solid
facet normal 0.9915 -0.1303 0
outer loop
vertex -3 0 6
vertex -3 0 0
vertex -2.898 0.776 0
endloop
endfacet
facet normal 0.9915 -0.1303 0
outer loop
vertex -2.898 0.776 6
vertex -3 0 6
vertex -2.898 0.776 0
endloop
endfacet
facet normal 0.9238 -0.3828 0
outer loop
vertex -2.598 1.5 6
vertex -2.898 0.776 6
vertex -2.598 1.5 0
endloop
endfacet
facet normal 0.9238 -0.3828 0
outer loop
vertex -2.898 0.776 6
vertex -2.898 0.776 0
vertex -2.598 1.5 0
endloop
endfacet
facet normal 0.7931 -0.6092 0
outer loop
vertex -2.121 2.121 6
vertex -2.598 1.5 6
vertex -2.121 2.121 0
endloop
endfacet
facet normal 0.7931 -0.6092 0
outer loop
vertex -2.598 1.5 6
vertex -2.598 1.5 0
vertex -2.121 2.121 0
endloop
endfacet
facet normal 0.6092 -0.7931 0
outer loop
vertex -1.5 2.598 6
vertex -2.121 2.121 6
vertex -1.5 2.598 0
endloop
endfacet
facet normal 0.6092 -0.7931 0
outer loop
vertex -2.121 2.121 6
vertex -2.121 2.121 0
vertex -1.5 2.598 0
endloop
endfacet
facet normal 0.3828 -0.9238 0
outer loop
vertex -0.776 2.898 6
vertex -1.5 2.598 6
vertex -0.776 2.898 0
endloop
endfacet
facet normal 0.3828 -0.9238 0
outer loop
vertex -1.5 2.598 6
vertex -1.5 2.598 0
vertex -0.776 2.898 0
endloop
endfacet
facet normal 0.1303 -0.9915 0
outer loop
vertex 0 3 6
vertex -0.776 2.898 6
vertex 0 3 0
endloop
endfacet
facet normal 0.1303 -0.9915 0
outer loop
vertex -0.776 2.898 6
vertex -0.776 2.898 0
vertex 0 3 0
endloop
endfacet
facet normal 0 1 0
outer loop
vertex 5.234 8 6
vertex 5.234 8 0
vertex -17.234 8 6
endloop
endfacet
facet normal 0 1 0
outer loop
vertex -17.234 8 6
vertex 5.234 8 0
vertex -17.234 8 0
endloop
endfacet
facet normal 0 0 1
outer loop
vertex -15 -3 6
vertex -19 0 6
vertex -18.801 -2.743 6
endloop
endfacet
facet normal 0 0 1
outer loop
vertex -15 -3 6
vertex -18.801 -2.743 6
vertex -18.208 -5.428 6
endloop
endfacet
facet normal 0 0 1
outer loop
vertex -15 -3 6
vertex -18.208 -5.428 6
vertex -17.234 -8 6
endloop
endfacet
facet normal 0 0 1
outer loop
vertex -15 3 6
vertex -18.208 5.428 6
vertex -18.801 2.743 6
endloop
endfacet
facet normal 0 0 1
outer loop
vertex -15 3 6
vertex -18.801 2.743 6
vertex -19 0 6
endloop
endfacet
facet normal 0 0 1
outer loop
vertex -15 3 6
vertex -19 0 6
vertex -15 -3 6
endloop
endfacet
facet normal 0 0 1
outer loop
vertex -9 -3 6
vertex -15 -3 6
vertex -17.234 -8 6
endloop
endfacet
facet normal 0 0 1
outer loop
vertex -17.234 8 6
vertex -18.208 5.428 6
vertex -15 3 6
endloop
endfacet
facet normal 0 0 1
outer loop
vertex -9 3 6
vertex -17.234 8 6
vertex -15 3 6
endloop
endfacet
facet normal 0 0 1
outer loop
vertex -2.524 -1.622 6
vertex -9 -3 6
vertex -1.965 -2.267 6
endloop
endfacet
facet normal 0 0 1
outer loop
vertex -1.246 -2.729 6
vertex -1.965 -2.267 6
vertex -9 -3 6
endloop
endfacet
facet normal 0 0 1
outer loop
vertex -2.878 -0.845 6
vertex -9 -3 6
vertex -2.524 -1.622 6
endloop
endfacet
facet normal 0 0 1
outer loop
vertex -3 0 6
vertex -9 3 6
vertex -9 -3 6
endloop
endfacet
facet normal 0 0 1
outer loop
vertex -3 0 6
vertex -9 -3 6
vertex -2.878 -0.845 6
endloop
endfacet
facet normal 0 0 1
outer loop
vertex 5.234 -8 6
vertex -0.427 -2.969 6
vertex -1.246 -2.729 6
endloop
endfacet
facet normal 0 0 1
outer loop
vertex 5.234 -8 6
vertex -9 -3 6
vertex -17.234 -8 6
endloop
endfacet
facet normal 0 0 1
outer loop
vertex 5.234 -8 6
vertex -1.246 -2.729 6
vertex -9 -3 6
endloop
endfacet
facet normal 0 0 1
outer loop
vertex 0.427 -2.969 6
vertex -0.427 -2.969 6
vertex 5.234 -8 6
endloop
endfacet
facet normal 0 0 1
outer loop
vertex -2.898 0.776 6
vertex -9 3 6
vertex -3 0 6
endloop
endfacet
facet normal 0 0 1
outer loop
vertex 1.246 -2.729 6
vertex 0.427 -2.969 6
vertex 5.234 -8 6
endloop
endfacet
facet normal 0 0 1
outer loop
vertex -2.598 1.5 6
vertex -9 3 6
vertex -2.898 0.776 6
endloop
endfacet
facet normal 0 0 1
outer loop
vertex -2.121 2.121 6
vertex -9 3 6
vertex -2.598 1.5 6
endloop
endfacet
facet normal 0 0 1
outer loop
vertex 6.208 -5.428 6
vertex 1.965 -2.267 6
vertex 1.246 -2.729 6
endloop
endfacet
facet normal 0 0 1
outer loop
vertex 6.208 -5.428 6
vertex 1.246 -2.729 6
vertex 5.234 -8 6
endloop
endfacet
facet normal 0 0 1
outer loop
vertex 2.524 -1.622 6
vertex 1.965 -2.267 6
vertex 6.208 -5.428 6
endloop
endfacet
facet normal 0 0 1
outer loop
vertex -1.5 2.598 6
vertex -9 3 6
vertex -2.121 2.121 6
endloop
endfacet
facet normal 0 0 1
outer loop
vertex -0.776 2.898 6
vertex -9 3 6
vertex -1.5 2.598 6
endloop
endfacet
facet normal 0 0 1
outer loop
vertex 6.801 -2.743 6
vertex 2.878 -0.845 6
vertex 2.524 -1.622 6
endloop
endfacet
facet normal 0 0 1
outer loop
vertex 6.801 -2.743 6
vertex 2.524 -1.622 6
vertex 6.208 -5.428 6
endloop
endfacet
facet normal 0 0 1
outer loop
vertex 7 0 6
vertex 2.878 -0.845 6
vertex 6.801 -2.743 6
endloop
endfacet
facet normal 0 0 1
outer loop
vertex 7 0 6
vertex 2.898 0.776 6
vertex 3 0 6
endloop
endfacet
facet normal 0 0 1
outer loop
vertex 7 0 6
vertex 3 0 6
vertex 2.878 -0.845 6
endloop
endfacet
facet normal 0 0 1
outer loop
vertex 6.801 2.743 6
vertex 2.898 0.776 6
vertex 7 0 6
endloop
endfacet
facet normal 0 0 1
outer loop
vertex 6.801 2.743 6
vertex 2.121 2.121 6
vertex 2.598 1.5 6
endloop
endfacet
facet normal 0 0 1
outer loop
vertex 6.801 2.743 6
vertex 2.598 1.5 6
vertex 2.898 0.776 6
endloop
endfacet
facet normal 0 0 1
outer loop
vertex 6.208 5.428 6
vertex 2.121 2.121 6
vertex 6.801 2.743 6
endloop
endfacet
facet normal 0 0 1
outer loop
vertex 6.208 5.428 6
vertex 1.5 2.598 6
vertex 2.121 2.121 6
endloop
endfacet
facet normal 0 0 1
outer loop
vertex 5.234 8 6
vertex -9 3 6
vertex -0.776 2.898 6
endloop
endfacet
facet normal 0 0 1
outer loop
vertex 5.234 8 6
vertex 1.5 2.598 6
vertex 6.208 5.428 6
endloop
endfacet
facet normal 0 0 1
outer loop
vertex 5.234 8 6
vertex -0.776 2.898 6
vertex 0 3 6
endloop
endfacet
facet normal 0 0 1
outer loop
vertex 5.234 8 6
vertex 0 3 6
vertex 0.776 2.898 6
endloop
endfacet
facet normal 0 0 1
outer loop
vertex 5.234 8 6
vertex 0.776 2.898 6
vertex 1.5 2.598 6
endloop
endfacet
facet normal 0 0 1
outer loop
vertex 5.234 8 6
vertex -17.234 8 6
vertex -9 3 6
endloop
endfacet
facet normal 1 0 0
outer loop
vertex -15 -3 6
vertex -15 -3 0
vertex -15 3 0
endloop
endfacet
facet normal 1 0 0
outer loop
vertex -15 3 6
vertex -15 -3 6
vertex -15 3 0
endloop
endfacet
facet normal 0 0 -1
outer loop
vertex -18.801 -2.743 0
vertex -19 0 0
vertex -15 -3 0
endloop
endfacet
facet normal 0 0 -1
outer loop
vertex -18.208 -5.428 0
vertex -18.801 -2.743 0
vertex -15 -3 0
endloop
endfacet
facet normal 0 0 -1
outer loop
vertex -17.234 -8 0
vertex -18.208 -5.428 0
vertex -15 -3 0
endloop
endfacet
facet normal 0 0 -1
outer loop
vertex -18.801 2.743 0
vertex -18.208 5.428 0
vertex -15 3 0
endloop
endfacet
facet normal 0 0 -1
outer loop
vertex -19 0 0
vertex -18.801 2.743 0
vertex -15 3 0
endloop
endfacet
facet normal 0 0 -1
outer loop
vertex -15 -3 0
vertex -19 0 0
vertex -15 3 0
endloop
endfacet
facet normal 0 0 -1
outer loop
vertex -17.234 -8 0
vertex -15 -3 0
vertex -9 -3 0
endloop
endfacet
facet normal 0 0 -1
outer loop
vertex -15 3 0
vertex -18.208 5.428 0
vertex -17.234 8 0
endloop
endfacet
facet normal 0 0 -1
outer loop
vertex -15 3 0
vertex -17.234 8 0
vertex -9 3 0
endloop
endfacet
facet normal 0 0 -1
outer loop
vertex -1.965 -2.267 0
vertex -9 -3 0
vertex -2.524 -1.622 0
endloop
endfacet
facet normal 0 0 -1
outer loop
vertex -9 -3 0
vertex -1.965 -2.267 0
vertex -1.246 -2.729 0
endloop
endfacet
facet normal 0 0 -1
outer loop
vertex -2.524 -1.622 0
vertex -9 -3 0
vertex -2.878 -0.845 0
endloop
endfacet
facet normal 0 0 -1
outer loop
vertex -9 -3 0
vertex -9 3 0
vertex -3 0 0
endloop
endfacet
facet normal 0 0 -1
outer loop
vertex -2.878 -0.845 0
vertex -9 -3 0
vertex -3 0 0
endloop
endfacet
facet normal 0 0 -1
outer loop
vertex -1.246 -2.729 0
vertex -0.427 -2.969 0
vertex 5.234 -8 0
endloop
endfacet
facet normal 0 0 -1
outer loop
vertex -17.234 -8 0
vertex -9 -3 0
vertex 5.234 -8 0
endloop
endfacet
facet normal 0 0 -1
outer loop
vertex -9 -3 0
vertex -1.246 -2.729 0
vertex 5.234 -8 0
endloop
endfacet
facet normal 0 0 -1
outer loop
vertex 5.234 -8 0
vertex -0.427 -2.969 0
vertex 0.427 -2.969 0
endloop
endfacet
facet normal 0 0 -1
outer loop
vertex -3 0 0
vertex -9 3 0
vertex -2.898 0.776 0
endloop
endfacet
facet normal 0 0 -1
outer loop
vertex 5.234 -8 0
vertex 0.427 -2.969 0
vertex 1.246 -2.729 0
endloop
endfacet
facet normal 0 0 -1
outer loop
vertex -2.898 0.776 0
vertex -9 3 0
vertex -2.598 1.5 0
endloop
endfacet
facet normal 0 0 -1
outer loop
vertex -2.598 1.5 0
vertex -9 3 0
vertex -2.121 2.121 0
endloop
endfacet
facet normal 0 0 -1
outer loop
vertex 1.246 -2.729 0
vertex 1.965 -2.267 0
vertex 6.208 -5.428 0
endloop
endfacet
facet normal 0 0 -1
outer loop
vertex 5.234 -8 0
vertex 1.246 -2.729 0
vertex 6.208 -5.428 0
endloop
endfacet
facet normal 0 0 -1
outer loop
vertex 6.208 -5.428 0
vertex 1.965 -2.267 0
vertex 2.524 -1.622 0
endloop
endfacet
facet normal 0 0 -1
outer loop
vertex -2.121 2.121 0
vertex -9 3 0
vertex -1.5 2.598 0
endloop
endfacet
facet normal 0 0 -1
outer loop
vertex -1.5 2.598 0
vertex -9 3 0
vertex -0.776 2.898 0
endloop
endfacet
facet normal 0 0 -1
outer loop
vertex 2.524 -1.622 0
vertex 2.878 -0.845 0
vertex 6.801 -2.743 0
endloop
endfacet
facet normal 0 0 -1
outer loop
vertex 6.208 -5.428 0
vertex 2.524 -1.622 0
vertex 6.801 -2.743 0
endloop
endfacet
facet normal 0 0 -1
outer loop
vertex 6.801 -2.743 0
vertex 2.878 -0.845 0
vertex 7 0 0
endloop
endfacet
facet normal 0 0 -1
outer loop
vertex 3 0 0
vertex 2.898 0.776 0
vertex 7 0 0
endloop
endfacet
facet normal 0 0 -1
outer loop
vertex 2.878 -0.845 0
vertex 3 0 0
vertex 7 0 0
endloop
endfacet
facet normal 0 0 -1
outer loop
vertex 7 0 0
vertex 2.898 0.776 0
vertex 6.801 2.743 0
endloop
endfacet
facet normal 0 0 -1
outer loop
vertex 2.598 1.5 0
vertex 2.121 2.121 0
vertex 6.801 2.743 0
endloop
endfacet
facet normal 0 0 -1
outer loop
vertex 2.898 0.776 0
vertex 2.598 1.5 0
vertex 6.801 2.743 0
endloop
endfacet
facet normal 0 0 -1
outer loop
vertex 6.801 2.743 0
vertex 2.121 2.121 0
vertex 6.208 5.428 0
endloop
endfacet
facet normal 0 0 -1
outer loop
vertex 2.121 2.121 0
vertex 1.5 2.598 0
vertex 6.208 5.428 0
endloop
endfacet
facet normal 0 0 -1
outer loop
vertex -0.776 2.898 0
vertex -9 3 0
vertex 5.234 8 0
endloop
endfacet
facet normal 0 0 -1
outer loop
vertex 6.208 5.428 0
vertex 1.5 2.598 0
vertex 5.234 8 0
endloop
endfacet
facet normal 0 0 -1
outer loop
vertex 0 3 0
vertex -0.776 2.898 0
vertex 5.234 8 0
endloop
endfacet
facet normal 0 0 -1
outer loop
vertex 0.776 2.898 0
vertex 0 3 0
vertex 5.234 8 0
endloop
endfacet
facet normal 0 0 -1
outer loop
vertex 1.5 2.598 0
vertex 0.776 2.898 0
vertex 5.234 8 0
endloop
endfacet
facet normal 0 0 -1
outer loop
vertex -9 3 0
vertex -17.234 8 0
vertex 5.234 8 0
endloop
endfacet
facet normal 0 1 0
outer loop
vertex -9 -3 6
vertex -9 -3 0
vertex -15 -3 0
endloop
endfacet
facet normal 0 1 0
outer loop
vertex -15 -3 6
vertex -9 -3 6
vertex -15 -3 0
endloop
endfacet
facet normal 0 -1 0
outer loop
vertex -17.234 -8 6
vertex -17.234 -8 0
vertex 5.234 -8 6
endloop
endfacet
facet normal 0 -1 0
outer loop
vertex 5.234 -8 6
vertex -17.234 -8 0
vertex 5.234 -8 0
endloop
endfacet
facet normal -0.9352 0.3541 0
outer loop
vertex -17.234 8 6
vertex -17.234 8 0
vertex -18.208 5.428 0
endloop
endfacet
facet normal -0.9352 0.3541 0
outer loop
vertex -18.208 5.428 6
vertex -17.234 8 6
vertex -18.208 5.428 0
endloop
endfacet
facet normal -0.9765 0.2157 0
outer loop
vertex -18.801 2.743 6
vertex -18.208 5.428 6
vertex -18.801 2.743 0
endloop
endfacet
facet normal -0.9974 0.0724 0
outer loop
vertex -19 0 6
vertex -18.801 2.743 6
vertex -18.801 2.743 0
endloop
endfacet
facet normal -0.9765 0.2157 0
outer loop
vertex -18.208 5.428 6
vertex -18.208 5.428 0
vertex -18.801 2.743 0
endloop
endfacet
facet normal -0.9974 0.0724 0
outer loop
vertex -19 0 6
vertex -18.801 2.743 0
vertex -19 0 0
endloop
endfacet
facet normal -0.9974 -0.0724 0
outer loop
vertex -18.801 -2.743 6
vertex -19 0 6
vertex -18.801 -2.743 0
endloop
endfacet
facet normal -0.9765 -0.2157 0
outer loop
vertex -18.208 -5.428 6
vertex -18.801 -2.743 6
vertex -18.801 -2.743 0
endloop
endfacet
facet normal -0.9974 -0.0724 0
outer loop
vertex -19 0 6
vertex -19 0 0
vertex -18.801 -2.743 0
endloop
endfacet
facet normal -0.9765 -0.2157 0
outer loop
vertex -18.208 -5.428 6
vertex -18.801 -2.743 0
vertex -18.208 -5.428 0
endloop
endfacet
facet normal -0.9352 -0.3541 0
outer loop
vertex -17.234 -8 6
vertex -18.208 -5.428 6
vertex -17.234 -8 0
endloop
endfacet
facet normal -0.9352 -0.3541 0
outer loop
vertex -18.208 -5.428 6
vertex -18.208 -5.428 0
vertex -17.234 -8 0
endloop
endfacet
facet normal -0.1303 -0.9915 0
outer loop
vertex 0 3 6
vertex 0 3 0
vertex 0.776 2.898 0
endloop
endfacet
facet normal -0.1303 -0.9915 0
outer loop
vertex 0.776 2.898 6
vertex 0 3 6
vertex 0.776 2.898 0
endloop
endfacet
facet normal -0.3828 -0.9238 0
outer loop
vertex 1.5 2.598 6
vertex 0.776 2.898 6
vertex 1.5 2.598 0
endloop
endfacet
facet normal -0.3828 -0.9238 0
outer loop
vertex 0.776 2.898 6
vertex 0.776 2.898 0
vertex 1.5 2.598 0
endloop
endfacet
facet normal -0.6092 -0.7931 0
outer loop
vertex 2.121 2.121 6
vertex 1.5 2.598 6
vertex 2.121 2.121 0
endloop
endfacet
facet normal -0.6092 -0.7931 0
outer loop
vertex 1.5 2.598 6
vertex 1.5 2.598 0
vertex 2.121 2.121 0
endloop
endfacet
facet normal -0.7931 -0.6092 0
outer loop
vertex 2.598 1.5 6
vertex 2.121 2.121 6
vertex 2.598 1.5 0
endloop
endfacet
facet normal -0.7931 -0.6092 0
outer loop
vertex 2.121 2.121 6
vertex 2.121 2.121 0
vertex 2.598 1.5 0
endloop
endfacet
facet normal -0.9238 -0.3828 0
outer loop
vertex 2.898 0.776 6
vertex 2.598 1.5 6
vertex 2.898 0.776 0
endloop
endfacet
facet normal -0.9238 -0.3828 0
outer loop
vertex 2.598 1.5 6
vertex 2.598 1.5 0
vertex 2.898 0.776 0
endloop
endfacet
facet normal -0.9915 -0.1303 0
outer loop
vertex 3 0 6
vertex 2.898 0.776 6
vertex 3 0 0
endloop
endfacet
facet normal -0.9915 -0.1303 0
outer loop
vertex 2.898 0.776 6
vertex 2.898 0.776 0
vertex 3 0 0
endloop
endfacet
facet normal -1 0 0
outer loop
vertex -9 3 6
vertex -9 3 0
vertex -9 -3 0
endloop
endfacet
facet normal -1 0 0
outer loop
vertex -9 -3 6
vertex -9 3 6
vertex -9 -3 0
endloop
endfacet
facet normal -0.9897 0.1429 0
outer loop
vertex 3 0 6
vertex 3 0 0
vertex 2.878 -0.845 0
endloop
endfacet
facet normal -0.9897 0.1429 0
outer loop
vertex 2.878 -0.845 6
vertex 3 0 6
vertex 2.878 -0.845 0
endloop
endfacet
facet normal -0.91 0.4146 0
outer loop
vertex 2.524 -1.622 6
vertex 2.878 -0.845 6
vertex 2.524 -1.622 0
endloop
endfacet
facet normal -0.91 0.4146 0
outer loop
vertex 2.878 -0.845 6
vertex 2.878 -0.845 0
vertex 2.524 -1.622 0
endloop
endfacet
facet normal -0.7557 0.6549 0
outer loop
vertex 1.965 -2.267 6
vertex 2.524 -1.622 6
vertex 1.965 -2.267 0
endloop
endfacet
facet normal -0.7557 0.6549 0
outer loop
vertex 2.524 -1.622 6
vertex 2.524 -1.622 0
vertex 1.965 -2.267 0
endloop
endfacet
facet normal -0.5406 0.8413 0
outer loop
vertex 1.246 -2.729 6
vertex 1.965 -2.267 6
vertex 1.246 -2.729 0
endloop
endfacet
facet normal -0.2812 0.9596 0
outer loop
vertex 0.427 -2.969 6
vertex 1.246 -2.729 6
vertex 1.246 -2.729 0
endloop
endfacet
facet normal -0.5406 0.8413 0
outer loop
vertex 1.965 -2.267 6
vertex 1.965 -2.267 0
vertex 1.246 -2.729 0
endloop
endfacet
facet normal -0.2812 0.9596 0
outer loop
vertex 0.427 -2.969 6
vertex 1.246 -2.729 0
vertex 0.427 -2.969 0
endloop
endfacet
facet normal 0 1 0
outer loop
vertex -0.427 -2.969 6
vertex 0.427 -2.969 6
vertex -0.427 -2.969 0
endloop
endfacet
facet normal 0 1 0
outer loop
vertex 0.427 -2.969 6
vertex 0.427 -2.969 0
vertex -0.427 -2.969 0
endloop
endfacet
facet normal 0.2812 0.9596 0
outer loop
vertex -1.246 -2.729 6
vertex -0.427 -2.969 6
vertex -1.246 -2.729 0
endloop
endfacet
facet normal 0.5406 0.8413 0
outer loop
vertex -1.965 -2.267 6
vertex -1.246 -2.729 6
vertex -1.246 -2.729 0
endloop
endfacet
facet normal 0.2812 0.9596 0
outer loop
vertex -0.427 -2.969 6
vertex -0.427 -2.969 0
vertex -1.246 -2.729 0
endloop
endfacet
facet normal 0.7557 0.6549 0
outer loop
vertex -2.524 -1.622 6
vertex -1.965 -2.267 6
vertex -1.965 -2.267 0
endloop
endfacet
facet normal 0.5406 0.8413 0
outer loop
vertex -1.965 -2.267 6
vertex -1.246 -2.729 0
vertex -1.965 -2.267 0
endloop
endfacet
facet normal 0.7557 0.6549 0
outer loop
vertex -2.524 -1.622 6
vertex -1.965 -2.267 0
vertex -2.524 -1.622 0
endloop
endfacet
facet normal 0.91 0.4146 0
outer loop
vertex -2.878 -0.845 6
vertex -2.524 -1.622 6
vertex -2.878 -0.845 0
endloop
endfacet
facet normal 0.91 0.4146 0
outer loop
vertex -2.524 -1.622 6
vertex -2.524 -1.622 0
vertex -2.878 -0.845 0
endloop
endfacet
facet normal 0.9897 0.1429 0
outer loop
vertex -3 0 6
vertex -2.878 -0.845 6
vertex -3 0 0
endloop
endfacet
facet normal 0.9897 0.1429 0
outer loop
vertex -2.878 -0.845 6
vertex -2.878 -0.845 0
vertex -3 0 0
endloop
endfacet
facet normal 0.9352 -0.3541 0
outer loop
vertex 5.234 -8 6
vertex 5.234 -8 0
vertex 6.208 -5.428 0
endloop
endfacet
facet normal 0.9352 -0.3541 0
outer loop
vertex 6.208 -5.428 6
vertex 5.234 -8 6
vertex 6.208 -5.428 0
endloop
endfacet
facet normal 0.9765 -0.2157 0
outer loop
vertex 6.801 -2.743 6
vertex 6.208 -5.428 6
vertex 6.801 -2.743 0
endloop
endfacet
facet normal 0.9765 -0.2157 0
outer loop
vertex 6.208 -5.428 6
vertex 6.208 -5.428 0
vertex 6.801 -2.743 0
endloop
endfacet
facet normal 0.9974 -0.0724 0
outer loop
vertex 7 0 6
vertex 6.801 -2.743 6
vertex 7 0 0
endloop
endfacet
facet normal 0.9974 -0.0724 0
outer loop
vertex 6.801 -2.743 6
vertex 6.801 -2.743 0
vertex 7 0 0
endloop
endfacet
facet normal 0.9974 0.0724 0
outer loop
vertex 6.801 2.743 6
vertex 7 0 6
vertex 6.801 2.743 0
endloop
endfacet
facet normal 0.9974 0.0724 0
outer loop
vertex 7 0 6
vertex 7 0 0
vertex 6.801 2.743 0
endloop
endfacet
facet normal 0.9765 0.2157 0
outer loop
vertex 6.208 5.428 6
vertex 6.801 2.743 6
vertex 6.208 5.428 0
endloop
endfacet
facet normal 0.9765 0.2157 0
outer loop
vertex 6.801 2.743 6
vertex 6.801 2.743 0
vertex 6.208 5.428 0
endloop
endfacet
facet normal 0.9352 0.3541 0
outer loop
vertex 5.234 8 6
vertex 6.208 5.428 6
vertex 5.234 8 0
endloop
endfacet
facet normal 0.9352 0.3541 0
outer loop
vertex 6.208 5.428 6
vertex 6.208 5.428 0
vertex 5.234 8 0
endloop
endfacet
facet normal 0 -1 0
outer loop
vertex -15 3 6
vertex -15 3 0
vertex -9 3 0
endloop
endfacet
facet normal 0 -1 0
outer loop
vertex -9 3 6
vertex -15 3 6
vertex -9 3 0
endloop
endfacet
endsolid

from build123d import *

# Parameters (mm, degrees)
F1_DEPTH = 6


with BuildPart() as f1:
    # F0 (on Top) → F1 (new body)
    with BuildSketch(Plane.XY):
        with BuildLine():
            Line((5.233688, 8), (0, 8))
            Line((0, 8), (-17.233688, 8))
            ThreePointArc((-17.233688, 8), (-19, 0), (-17.233688, -8))
            Line((-17.233688, -8), (5.233688, -8))
            ThreePointArc((5.233688, -8), (7, 0), (5.233688, 8))
        make_face()
        Polygon((-9, 3), (-9, 0), (-9, -3), (-15, -3), (-15, 3), align=None, mode=Mode.SUBTRACT)
        with BuildLine():
            ThreePointArc((0, 3), (2.12132, 2.12132), (3, 0))
            ThreePointArc((3, 0), (0, -3), (-3, 0))
            ThreePointArc((-3, 0), (-2.12132, 2.12132), (0, 3))
        make_face(mode=Mode.SUBTRACT)
    extrude(amount=F1_DEPTH)


solid = f1.part
